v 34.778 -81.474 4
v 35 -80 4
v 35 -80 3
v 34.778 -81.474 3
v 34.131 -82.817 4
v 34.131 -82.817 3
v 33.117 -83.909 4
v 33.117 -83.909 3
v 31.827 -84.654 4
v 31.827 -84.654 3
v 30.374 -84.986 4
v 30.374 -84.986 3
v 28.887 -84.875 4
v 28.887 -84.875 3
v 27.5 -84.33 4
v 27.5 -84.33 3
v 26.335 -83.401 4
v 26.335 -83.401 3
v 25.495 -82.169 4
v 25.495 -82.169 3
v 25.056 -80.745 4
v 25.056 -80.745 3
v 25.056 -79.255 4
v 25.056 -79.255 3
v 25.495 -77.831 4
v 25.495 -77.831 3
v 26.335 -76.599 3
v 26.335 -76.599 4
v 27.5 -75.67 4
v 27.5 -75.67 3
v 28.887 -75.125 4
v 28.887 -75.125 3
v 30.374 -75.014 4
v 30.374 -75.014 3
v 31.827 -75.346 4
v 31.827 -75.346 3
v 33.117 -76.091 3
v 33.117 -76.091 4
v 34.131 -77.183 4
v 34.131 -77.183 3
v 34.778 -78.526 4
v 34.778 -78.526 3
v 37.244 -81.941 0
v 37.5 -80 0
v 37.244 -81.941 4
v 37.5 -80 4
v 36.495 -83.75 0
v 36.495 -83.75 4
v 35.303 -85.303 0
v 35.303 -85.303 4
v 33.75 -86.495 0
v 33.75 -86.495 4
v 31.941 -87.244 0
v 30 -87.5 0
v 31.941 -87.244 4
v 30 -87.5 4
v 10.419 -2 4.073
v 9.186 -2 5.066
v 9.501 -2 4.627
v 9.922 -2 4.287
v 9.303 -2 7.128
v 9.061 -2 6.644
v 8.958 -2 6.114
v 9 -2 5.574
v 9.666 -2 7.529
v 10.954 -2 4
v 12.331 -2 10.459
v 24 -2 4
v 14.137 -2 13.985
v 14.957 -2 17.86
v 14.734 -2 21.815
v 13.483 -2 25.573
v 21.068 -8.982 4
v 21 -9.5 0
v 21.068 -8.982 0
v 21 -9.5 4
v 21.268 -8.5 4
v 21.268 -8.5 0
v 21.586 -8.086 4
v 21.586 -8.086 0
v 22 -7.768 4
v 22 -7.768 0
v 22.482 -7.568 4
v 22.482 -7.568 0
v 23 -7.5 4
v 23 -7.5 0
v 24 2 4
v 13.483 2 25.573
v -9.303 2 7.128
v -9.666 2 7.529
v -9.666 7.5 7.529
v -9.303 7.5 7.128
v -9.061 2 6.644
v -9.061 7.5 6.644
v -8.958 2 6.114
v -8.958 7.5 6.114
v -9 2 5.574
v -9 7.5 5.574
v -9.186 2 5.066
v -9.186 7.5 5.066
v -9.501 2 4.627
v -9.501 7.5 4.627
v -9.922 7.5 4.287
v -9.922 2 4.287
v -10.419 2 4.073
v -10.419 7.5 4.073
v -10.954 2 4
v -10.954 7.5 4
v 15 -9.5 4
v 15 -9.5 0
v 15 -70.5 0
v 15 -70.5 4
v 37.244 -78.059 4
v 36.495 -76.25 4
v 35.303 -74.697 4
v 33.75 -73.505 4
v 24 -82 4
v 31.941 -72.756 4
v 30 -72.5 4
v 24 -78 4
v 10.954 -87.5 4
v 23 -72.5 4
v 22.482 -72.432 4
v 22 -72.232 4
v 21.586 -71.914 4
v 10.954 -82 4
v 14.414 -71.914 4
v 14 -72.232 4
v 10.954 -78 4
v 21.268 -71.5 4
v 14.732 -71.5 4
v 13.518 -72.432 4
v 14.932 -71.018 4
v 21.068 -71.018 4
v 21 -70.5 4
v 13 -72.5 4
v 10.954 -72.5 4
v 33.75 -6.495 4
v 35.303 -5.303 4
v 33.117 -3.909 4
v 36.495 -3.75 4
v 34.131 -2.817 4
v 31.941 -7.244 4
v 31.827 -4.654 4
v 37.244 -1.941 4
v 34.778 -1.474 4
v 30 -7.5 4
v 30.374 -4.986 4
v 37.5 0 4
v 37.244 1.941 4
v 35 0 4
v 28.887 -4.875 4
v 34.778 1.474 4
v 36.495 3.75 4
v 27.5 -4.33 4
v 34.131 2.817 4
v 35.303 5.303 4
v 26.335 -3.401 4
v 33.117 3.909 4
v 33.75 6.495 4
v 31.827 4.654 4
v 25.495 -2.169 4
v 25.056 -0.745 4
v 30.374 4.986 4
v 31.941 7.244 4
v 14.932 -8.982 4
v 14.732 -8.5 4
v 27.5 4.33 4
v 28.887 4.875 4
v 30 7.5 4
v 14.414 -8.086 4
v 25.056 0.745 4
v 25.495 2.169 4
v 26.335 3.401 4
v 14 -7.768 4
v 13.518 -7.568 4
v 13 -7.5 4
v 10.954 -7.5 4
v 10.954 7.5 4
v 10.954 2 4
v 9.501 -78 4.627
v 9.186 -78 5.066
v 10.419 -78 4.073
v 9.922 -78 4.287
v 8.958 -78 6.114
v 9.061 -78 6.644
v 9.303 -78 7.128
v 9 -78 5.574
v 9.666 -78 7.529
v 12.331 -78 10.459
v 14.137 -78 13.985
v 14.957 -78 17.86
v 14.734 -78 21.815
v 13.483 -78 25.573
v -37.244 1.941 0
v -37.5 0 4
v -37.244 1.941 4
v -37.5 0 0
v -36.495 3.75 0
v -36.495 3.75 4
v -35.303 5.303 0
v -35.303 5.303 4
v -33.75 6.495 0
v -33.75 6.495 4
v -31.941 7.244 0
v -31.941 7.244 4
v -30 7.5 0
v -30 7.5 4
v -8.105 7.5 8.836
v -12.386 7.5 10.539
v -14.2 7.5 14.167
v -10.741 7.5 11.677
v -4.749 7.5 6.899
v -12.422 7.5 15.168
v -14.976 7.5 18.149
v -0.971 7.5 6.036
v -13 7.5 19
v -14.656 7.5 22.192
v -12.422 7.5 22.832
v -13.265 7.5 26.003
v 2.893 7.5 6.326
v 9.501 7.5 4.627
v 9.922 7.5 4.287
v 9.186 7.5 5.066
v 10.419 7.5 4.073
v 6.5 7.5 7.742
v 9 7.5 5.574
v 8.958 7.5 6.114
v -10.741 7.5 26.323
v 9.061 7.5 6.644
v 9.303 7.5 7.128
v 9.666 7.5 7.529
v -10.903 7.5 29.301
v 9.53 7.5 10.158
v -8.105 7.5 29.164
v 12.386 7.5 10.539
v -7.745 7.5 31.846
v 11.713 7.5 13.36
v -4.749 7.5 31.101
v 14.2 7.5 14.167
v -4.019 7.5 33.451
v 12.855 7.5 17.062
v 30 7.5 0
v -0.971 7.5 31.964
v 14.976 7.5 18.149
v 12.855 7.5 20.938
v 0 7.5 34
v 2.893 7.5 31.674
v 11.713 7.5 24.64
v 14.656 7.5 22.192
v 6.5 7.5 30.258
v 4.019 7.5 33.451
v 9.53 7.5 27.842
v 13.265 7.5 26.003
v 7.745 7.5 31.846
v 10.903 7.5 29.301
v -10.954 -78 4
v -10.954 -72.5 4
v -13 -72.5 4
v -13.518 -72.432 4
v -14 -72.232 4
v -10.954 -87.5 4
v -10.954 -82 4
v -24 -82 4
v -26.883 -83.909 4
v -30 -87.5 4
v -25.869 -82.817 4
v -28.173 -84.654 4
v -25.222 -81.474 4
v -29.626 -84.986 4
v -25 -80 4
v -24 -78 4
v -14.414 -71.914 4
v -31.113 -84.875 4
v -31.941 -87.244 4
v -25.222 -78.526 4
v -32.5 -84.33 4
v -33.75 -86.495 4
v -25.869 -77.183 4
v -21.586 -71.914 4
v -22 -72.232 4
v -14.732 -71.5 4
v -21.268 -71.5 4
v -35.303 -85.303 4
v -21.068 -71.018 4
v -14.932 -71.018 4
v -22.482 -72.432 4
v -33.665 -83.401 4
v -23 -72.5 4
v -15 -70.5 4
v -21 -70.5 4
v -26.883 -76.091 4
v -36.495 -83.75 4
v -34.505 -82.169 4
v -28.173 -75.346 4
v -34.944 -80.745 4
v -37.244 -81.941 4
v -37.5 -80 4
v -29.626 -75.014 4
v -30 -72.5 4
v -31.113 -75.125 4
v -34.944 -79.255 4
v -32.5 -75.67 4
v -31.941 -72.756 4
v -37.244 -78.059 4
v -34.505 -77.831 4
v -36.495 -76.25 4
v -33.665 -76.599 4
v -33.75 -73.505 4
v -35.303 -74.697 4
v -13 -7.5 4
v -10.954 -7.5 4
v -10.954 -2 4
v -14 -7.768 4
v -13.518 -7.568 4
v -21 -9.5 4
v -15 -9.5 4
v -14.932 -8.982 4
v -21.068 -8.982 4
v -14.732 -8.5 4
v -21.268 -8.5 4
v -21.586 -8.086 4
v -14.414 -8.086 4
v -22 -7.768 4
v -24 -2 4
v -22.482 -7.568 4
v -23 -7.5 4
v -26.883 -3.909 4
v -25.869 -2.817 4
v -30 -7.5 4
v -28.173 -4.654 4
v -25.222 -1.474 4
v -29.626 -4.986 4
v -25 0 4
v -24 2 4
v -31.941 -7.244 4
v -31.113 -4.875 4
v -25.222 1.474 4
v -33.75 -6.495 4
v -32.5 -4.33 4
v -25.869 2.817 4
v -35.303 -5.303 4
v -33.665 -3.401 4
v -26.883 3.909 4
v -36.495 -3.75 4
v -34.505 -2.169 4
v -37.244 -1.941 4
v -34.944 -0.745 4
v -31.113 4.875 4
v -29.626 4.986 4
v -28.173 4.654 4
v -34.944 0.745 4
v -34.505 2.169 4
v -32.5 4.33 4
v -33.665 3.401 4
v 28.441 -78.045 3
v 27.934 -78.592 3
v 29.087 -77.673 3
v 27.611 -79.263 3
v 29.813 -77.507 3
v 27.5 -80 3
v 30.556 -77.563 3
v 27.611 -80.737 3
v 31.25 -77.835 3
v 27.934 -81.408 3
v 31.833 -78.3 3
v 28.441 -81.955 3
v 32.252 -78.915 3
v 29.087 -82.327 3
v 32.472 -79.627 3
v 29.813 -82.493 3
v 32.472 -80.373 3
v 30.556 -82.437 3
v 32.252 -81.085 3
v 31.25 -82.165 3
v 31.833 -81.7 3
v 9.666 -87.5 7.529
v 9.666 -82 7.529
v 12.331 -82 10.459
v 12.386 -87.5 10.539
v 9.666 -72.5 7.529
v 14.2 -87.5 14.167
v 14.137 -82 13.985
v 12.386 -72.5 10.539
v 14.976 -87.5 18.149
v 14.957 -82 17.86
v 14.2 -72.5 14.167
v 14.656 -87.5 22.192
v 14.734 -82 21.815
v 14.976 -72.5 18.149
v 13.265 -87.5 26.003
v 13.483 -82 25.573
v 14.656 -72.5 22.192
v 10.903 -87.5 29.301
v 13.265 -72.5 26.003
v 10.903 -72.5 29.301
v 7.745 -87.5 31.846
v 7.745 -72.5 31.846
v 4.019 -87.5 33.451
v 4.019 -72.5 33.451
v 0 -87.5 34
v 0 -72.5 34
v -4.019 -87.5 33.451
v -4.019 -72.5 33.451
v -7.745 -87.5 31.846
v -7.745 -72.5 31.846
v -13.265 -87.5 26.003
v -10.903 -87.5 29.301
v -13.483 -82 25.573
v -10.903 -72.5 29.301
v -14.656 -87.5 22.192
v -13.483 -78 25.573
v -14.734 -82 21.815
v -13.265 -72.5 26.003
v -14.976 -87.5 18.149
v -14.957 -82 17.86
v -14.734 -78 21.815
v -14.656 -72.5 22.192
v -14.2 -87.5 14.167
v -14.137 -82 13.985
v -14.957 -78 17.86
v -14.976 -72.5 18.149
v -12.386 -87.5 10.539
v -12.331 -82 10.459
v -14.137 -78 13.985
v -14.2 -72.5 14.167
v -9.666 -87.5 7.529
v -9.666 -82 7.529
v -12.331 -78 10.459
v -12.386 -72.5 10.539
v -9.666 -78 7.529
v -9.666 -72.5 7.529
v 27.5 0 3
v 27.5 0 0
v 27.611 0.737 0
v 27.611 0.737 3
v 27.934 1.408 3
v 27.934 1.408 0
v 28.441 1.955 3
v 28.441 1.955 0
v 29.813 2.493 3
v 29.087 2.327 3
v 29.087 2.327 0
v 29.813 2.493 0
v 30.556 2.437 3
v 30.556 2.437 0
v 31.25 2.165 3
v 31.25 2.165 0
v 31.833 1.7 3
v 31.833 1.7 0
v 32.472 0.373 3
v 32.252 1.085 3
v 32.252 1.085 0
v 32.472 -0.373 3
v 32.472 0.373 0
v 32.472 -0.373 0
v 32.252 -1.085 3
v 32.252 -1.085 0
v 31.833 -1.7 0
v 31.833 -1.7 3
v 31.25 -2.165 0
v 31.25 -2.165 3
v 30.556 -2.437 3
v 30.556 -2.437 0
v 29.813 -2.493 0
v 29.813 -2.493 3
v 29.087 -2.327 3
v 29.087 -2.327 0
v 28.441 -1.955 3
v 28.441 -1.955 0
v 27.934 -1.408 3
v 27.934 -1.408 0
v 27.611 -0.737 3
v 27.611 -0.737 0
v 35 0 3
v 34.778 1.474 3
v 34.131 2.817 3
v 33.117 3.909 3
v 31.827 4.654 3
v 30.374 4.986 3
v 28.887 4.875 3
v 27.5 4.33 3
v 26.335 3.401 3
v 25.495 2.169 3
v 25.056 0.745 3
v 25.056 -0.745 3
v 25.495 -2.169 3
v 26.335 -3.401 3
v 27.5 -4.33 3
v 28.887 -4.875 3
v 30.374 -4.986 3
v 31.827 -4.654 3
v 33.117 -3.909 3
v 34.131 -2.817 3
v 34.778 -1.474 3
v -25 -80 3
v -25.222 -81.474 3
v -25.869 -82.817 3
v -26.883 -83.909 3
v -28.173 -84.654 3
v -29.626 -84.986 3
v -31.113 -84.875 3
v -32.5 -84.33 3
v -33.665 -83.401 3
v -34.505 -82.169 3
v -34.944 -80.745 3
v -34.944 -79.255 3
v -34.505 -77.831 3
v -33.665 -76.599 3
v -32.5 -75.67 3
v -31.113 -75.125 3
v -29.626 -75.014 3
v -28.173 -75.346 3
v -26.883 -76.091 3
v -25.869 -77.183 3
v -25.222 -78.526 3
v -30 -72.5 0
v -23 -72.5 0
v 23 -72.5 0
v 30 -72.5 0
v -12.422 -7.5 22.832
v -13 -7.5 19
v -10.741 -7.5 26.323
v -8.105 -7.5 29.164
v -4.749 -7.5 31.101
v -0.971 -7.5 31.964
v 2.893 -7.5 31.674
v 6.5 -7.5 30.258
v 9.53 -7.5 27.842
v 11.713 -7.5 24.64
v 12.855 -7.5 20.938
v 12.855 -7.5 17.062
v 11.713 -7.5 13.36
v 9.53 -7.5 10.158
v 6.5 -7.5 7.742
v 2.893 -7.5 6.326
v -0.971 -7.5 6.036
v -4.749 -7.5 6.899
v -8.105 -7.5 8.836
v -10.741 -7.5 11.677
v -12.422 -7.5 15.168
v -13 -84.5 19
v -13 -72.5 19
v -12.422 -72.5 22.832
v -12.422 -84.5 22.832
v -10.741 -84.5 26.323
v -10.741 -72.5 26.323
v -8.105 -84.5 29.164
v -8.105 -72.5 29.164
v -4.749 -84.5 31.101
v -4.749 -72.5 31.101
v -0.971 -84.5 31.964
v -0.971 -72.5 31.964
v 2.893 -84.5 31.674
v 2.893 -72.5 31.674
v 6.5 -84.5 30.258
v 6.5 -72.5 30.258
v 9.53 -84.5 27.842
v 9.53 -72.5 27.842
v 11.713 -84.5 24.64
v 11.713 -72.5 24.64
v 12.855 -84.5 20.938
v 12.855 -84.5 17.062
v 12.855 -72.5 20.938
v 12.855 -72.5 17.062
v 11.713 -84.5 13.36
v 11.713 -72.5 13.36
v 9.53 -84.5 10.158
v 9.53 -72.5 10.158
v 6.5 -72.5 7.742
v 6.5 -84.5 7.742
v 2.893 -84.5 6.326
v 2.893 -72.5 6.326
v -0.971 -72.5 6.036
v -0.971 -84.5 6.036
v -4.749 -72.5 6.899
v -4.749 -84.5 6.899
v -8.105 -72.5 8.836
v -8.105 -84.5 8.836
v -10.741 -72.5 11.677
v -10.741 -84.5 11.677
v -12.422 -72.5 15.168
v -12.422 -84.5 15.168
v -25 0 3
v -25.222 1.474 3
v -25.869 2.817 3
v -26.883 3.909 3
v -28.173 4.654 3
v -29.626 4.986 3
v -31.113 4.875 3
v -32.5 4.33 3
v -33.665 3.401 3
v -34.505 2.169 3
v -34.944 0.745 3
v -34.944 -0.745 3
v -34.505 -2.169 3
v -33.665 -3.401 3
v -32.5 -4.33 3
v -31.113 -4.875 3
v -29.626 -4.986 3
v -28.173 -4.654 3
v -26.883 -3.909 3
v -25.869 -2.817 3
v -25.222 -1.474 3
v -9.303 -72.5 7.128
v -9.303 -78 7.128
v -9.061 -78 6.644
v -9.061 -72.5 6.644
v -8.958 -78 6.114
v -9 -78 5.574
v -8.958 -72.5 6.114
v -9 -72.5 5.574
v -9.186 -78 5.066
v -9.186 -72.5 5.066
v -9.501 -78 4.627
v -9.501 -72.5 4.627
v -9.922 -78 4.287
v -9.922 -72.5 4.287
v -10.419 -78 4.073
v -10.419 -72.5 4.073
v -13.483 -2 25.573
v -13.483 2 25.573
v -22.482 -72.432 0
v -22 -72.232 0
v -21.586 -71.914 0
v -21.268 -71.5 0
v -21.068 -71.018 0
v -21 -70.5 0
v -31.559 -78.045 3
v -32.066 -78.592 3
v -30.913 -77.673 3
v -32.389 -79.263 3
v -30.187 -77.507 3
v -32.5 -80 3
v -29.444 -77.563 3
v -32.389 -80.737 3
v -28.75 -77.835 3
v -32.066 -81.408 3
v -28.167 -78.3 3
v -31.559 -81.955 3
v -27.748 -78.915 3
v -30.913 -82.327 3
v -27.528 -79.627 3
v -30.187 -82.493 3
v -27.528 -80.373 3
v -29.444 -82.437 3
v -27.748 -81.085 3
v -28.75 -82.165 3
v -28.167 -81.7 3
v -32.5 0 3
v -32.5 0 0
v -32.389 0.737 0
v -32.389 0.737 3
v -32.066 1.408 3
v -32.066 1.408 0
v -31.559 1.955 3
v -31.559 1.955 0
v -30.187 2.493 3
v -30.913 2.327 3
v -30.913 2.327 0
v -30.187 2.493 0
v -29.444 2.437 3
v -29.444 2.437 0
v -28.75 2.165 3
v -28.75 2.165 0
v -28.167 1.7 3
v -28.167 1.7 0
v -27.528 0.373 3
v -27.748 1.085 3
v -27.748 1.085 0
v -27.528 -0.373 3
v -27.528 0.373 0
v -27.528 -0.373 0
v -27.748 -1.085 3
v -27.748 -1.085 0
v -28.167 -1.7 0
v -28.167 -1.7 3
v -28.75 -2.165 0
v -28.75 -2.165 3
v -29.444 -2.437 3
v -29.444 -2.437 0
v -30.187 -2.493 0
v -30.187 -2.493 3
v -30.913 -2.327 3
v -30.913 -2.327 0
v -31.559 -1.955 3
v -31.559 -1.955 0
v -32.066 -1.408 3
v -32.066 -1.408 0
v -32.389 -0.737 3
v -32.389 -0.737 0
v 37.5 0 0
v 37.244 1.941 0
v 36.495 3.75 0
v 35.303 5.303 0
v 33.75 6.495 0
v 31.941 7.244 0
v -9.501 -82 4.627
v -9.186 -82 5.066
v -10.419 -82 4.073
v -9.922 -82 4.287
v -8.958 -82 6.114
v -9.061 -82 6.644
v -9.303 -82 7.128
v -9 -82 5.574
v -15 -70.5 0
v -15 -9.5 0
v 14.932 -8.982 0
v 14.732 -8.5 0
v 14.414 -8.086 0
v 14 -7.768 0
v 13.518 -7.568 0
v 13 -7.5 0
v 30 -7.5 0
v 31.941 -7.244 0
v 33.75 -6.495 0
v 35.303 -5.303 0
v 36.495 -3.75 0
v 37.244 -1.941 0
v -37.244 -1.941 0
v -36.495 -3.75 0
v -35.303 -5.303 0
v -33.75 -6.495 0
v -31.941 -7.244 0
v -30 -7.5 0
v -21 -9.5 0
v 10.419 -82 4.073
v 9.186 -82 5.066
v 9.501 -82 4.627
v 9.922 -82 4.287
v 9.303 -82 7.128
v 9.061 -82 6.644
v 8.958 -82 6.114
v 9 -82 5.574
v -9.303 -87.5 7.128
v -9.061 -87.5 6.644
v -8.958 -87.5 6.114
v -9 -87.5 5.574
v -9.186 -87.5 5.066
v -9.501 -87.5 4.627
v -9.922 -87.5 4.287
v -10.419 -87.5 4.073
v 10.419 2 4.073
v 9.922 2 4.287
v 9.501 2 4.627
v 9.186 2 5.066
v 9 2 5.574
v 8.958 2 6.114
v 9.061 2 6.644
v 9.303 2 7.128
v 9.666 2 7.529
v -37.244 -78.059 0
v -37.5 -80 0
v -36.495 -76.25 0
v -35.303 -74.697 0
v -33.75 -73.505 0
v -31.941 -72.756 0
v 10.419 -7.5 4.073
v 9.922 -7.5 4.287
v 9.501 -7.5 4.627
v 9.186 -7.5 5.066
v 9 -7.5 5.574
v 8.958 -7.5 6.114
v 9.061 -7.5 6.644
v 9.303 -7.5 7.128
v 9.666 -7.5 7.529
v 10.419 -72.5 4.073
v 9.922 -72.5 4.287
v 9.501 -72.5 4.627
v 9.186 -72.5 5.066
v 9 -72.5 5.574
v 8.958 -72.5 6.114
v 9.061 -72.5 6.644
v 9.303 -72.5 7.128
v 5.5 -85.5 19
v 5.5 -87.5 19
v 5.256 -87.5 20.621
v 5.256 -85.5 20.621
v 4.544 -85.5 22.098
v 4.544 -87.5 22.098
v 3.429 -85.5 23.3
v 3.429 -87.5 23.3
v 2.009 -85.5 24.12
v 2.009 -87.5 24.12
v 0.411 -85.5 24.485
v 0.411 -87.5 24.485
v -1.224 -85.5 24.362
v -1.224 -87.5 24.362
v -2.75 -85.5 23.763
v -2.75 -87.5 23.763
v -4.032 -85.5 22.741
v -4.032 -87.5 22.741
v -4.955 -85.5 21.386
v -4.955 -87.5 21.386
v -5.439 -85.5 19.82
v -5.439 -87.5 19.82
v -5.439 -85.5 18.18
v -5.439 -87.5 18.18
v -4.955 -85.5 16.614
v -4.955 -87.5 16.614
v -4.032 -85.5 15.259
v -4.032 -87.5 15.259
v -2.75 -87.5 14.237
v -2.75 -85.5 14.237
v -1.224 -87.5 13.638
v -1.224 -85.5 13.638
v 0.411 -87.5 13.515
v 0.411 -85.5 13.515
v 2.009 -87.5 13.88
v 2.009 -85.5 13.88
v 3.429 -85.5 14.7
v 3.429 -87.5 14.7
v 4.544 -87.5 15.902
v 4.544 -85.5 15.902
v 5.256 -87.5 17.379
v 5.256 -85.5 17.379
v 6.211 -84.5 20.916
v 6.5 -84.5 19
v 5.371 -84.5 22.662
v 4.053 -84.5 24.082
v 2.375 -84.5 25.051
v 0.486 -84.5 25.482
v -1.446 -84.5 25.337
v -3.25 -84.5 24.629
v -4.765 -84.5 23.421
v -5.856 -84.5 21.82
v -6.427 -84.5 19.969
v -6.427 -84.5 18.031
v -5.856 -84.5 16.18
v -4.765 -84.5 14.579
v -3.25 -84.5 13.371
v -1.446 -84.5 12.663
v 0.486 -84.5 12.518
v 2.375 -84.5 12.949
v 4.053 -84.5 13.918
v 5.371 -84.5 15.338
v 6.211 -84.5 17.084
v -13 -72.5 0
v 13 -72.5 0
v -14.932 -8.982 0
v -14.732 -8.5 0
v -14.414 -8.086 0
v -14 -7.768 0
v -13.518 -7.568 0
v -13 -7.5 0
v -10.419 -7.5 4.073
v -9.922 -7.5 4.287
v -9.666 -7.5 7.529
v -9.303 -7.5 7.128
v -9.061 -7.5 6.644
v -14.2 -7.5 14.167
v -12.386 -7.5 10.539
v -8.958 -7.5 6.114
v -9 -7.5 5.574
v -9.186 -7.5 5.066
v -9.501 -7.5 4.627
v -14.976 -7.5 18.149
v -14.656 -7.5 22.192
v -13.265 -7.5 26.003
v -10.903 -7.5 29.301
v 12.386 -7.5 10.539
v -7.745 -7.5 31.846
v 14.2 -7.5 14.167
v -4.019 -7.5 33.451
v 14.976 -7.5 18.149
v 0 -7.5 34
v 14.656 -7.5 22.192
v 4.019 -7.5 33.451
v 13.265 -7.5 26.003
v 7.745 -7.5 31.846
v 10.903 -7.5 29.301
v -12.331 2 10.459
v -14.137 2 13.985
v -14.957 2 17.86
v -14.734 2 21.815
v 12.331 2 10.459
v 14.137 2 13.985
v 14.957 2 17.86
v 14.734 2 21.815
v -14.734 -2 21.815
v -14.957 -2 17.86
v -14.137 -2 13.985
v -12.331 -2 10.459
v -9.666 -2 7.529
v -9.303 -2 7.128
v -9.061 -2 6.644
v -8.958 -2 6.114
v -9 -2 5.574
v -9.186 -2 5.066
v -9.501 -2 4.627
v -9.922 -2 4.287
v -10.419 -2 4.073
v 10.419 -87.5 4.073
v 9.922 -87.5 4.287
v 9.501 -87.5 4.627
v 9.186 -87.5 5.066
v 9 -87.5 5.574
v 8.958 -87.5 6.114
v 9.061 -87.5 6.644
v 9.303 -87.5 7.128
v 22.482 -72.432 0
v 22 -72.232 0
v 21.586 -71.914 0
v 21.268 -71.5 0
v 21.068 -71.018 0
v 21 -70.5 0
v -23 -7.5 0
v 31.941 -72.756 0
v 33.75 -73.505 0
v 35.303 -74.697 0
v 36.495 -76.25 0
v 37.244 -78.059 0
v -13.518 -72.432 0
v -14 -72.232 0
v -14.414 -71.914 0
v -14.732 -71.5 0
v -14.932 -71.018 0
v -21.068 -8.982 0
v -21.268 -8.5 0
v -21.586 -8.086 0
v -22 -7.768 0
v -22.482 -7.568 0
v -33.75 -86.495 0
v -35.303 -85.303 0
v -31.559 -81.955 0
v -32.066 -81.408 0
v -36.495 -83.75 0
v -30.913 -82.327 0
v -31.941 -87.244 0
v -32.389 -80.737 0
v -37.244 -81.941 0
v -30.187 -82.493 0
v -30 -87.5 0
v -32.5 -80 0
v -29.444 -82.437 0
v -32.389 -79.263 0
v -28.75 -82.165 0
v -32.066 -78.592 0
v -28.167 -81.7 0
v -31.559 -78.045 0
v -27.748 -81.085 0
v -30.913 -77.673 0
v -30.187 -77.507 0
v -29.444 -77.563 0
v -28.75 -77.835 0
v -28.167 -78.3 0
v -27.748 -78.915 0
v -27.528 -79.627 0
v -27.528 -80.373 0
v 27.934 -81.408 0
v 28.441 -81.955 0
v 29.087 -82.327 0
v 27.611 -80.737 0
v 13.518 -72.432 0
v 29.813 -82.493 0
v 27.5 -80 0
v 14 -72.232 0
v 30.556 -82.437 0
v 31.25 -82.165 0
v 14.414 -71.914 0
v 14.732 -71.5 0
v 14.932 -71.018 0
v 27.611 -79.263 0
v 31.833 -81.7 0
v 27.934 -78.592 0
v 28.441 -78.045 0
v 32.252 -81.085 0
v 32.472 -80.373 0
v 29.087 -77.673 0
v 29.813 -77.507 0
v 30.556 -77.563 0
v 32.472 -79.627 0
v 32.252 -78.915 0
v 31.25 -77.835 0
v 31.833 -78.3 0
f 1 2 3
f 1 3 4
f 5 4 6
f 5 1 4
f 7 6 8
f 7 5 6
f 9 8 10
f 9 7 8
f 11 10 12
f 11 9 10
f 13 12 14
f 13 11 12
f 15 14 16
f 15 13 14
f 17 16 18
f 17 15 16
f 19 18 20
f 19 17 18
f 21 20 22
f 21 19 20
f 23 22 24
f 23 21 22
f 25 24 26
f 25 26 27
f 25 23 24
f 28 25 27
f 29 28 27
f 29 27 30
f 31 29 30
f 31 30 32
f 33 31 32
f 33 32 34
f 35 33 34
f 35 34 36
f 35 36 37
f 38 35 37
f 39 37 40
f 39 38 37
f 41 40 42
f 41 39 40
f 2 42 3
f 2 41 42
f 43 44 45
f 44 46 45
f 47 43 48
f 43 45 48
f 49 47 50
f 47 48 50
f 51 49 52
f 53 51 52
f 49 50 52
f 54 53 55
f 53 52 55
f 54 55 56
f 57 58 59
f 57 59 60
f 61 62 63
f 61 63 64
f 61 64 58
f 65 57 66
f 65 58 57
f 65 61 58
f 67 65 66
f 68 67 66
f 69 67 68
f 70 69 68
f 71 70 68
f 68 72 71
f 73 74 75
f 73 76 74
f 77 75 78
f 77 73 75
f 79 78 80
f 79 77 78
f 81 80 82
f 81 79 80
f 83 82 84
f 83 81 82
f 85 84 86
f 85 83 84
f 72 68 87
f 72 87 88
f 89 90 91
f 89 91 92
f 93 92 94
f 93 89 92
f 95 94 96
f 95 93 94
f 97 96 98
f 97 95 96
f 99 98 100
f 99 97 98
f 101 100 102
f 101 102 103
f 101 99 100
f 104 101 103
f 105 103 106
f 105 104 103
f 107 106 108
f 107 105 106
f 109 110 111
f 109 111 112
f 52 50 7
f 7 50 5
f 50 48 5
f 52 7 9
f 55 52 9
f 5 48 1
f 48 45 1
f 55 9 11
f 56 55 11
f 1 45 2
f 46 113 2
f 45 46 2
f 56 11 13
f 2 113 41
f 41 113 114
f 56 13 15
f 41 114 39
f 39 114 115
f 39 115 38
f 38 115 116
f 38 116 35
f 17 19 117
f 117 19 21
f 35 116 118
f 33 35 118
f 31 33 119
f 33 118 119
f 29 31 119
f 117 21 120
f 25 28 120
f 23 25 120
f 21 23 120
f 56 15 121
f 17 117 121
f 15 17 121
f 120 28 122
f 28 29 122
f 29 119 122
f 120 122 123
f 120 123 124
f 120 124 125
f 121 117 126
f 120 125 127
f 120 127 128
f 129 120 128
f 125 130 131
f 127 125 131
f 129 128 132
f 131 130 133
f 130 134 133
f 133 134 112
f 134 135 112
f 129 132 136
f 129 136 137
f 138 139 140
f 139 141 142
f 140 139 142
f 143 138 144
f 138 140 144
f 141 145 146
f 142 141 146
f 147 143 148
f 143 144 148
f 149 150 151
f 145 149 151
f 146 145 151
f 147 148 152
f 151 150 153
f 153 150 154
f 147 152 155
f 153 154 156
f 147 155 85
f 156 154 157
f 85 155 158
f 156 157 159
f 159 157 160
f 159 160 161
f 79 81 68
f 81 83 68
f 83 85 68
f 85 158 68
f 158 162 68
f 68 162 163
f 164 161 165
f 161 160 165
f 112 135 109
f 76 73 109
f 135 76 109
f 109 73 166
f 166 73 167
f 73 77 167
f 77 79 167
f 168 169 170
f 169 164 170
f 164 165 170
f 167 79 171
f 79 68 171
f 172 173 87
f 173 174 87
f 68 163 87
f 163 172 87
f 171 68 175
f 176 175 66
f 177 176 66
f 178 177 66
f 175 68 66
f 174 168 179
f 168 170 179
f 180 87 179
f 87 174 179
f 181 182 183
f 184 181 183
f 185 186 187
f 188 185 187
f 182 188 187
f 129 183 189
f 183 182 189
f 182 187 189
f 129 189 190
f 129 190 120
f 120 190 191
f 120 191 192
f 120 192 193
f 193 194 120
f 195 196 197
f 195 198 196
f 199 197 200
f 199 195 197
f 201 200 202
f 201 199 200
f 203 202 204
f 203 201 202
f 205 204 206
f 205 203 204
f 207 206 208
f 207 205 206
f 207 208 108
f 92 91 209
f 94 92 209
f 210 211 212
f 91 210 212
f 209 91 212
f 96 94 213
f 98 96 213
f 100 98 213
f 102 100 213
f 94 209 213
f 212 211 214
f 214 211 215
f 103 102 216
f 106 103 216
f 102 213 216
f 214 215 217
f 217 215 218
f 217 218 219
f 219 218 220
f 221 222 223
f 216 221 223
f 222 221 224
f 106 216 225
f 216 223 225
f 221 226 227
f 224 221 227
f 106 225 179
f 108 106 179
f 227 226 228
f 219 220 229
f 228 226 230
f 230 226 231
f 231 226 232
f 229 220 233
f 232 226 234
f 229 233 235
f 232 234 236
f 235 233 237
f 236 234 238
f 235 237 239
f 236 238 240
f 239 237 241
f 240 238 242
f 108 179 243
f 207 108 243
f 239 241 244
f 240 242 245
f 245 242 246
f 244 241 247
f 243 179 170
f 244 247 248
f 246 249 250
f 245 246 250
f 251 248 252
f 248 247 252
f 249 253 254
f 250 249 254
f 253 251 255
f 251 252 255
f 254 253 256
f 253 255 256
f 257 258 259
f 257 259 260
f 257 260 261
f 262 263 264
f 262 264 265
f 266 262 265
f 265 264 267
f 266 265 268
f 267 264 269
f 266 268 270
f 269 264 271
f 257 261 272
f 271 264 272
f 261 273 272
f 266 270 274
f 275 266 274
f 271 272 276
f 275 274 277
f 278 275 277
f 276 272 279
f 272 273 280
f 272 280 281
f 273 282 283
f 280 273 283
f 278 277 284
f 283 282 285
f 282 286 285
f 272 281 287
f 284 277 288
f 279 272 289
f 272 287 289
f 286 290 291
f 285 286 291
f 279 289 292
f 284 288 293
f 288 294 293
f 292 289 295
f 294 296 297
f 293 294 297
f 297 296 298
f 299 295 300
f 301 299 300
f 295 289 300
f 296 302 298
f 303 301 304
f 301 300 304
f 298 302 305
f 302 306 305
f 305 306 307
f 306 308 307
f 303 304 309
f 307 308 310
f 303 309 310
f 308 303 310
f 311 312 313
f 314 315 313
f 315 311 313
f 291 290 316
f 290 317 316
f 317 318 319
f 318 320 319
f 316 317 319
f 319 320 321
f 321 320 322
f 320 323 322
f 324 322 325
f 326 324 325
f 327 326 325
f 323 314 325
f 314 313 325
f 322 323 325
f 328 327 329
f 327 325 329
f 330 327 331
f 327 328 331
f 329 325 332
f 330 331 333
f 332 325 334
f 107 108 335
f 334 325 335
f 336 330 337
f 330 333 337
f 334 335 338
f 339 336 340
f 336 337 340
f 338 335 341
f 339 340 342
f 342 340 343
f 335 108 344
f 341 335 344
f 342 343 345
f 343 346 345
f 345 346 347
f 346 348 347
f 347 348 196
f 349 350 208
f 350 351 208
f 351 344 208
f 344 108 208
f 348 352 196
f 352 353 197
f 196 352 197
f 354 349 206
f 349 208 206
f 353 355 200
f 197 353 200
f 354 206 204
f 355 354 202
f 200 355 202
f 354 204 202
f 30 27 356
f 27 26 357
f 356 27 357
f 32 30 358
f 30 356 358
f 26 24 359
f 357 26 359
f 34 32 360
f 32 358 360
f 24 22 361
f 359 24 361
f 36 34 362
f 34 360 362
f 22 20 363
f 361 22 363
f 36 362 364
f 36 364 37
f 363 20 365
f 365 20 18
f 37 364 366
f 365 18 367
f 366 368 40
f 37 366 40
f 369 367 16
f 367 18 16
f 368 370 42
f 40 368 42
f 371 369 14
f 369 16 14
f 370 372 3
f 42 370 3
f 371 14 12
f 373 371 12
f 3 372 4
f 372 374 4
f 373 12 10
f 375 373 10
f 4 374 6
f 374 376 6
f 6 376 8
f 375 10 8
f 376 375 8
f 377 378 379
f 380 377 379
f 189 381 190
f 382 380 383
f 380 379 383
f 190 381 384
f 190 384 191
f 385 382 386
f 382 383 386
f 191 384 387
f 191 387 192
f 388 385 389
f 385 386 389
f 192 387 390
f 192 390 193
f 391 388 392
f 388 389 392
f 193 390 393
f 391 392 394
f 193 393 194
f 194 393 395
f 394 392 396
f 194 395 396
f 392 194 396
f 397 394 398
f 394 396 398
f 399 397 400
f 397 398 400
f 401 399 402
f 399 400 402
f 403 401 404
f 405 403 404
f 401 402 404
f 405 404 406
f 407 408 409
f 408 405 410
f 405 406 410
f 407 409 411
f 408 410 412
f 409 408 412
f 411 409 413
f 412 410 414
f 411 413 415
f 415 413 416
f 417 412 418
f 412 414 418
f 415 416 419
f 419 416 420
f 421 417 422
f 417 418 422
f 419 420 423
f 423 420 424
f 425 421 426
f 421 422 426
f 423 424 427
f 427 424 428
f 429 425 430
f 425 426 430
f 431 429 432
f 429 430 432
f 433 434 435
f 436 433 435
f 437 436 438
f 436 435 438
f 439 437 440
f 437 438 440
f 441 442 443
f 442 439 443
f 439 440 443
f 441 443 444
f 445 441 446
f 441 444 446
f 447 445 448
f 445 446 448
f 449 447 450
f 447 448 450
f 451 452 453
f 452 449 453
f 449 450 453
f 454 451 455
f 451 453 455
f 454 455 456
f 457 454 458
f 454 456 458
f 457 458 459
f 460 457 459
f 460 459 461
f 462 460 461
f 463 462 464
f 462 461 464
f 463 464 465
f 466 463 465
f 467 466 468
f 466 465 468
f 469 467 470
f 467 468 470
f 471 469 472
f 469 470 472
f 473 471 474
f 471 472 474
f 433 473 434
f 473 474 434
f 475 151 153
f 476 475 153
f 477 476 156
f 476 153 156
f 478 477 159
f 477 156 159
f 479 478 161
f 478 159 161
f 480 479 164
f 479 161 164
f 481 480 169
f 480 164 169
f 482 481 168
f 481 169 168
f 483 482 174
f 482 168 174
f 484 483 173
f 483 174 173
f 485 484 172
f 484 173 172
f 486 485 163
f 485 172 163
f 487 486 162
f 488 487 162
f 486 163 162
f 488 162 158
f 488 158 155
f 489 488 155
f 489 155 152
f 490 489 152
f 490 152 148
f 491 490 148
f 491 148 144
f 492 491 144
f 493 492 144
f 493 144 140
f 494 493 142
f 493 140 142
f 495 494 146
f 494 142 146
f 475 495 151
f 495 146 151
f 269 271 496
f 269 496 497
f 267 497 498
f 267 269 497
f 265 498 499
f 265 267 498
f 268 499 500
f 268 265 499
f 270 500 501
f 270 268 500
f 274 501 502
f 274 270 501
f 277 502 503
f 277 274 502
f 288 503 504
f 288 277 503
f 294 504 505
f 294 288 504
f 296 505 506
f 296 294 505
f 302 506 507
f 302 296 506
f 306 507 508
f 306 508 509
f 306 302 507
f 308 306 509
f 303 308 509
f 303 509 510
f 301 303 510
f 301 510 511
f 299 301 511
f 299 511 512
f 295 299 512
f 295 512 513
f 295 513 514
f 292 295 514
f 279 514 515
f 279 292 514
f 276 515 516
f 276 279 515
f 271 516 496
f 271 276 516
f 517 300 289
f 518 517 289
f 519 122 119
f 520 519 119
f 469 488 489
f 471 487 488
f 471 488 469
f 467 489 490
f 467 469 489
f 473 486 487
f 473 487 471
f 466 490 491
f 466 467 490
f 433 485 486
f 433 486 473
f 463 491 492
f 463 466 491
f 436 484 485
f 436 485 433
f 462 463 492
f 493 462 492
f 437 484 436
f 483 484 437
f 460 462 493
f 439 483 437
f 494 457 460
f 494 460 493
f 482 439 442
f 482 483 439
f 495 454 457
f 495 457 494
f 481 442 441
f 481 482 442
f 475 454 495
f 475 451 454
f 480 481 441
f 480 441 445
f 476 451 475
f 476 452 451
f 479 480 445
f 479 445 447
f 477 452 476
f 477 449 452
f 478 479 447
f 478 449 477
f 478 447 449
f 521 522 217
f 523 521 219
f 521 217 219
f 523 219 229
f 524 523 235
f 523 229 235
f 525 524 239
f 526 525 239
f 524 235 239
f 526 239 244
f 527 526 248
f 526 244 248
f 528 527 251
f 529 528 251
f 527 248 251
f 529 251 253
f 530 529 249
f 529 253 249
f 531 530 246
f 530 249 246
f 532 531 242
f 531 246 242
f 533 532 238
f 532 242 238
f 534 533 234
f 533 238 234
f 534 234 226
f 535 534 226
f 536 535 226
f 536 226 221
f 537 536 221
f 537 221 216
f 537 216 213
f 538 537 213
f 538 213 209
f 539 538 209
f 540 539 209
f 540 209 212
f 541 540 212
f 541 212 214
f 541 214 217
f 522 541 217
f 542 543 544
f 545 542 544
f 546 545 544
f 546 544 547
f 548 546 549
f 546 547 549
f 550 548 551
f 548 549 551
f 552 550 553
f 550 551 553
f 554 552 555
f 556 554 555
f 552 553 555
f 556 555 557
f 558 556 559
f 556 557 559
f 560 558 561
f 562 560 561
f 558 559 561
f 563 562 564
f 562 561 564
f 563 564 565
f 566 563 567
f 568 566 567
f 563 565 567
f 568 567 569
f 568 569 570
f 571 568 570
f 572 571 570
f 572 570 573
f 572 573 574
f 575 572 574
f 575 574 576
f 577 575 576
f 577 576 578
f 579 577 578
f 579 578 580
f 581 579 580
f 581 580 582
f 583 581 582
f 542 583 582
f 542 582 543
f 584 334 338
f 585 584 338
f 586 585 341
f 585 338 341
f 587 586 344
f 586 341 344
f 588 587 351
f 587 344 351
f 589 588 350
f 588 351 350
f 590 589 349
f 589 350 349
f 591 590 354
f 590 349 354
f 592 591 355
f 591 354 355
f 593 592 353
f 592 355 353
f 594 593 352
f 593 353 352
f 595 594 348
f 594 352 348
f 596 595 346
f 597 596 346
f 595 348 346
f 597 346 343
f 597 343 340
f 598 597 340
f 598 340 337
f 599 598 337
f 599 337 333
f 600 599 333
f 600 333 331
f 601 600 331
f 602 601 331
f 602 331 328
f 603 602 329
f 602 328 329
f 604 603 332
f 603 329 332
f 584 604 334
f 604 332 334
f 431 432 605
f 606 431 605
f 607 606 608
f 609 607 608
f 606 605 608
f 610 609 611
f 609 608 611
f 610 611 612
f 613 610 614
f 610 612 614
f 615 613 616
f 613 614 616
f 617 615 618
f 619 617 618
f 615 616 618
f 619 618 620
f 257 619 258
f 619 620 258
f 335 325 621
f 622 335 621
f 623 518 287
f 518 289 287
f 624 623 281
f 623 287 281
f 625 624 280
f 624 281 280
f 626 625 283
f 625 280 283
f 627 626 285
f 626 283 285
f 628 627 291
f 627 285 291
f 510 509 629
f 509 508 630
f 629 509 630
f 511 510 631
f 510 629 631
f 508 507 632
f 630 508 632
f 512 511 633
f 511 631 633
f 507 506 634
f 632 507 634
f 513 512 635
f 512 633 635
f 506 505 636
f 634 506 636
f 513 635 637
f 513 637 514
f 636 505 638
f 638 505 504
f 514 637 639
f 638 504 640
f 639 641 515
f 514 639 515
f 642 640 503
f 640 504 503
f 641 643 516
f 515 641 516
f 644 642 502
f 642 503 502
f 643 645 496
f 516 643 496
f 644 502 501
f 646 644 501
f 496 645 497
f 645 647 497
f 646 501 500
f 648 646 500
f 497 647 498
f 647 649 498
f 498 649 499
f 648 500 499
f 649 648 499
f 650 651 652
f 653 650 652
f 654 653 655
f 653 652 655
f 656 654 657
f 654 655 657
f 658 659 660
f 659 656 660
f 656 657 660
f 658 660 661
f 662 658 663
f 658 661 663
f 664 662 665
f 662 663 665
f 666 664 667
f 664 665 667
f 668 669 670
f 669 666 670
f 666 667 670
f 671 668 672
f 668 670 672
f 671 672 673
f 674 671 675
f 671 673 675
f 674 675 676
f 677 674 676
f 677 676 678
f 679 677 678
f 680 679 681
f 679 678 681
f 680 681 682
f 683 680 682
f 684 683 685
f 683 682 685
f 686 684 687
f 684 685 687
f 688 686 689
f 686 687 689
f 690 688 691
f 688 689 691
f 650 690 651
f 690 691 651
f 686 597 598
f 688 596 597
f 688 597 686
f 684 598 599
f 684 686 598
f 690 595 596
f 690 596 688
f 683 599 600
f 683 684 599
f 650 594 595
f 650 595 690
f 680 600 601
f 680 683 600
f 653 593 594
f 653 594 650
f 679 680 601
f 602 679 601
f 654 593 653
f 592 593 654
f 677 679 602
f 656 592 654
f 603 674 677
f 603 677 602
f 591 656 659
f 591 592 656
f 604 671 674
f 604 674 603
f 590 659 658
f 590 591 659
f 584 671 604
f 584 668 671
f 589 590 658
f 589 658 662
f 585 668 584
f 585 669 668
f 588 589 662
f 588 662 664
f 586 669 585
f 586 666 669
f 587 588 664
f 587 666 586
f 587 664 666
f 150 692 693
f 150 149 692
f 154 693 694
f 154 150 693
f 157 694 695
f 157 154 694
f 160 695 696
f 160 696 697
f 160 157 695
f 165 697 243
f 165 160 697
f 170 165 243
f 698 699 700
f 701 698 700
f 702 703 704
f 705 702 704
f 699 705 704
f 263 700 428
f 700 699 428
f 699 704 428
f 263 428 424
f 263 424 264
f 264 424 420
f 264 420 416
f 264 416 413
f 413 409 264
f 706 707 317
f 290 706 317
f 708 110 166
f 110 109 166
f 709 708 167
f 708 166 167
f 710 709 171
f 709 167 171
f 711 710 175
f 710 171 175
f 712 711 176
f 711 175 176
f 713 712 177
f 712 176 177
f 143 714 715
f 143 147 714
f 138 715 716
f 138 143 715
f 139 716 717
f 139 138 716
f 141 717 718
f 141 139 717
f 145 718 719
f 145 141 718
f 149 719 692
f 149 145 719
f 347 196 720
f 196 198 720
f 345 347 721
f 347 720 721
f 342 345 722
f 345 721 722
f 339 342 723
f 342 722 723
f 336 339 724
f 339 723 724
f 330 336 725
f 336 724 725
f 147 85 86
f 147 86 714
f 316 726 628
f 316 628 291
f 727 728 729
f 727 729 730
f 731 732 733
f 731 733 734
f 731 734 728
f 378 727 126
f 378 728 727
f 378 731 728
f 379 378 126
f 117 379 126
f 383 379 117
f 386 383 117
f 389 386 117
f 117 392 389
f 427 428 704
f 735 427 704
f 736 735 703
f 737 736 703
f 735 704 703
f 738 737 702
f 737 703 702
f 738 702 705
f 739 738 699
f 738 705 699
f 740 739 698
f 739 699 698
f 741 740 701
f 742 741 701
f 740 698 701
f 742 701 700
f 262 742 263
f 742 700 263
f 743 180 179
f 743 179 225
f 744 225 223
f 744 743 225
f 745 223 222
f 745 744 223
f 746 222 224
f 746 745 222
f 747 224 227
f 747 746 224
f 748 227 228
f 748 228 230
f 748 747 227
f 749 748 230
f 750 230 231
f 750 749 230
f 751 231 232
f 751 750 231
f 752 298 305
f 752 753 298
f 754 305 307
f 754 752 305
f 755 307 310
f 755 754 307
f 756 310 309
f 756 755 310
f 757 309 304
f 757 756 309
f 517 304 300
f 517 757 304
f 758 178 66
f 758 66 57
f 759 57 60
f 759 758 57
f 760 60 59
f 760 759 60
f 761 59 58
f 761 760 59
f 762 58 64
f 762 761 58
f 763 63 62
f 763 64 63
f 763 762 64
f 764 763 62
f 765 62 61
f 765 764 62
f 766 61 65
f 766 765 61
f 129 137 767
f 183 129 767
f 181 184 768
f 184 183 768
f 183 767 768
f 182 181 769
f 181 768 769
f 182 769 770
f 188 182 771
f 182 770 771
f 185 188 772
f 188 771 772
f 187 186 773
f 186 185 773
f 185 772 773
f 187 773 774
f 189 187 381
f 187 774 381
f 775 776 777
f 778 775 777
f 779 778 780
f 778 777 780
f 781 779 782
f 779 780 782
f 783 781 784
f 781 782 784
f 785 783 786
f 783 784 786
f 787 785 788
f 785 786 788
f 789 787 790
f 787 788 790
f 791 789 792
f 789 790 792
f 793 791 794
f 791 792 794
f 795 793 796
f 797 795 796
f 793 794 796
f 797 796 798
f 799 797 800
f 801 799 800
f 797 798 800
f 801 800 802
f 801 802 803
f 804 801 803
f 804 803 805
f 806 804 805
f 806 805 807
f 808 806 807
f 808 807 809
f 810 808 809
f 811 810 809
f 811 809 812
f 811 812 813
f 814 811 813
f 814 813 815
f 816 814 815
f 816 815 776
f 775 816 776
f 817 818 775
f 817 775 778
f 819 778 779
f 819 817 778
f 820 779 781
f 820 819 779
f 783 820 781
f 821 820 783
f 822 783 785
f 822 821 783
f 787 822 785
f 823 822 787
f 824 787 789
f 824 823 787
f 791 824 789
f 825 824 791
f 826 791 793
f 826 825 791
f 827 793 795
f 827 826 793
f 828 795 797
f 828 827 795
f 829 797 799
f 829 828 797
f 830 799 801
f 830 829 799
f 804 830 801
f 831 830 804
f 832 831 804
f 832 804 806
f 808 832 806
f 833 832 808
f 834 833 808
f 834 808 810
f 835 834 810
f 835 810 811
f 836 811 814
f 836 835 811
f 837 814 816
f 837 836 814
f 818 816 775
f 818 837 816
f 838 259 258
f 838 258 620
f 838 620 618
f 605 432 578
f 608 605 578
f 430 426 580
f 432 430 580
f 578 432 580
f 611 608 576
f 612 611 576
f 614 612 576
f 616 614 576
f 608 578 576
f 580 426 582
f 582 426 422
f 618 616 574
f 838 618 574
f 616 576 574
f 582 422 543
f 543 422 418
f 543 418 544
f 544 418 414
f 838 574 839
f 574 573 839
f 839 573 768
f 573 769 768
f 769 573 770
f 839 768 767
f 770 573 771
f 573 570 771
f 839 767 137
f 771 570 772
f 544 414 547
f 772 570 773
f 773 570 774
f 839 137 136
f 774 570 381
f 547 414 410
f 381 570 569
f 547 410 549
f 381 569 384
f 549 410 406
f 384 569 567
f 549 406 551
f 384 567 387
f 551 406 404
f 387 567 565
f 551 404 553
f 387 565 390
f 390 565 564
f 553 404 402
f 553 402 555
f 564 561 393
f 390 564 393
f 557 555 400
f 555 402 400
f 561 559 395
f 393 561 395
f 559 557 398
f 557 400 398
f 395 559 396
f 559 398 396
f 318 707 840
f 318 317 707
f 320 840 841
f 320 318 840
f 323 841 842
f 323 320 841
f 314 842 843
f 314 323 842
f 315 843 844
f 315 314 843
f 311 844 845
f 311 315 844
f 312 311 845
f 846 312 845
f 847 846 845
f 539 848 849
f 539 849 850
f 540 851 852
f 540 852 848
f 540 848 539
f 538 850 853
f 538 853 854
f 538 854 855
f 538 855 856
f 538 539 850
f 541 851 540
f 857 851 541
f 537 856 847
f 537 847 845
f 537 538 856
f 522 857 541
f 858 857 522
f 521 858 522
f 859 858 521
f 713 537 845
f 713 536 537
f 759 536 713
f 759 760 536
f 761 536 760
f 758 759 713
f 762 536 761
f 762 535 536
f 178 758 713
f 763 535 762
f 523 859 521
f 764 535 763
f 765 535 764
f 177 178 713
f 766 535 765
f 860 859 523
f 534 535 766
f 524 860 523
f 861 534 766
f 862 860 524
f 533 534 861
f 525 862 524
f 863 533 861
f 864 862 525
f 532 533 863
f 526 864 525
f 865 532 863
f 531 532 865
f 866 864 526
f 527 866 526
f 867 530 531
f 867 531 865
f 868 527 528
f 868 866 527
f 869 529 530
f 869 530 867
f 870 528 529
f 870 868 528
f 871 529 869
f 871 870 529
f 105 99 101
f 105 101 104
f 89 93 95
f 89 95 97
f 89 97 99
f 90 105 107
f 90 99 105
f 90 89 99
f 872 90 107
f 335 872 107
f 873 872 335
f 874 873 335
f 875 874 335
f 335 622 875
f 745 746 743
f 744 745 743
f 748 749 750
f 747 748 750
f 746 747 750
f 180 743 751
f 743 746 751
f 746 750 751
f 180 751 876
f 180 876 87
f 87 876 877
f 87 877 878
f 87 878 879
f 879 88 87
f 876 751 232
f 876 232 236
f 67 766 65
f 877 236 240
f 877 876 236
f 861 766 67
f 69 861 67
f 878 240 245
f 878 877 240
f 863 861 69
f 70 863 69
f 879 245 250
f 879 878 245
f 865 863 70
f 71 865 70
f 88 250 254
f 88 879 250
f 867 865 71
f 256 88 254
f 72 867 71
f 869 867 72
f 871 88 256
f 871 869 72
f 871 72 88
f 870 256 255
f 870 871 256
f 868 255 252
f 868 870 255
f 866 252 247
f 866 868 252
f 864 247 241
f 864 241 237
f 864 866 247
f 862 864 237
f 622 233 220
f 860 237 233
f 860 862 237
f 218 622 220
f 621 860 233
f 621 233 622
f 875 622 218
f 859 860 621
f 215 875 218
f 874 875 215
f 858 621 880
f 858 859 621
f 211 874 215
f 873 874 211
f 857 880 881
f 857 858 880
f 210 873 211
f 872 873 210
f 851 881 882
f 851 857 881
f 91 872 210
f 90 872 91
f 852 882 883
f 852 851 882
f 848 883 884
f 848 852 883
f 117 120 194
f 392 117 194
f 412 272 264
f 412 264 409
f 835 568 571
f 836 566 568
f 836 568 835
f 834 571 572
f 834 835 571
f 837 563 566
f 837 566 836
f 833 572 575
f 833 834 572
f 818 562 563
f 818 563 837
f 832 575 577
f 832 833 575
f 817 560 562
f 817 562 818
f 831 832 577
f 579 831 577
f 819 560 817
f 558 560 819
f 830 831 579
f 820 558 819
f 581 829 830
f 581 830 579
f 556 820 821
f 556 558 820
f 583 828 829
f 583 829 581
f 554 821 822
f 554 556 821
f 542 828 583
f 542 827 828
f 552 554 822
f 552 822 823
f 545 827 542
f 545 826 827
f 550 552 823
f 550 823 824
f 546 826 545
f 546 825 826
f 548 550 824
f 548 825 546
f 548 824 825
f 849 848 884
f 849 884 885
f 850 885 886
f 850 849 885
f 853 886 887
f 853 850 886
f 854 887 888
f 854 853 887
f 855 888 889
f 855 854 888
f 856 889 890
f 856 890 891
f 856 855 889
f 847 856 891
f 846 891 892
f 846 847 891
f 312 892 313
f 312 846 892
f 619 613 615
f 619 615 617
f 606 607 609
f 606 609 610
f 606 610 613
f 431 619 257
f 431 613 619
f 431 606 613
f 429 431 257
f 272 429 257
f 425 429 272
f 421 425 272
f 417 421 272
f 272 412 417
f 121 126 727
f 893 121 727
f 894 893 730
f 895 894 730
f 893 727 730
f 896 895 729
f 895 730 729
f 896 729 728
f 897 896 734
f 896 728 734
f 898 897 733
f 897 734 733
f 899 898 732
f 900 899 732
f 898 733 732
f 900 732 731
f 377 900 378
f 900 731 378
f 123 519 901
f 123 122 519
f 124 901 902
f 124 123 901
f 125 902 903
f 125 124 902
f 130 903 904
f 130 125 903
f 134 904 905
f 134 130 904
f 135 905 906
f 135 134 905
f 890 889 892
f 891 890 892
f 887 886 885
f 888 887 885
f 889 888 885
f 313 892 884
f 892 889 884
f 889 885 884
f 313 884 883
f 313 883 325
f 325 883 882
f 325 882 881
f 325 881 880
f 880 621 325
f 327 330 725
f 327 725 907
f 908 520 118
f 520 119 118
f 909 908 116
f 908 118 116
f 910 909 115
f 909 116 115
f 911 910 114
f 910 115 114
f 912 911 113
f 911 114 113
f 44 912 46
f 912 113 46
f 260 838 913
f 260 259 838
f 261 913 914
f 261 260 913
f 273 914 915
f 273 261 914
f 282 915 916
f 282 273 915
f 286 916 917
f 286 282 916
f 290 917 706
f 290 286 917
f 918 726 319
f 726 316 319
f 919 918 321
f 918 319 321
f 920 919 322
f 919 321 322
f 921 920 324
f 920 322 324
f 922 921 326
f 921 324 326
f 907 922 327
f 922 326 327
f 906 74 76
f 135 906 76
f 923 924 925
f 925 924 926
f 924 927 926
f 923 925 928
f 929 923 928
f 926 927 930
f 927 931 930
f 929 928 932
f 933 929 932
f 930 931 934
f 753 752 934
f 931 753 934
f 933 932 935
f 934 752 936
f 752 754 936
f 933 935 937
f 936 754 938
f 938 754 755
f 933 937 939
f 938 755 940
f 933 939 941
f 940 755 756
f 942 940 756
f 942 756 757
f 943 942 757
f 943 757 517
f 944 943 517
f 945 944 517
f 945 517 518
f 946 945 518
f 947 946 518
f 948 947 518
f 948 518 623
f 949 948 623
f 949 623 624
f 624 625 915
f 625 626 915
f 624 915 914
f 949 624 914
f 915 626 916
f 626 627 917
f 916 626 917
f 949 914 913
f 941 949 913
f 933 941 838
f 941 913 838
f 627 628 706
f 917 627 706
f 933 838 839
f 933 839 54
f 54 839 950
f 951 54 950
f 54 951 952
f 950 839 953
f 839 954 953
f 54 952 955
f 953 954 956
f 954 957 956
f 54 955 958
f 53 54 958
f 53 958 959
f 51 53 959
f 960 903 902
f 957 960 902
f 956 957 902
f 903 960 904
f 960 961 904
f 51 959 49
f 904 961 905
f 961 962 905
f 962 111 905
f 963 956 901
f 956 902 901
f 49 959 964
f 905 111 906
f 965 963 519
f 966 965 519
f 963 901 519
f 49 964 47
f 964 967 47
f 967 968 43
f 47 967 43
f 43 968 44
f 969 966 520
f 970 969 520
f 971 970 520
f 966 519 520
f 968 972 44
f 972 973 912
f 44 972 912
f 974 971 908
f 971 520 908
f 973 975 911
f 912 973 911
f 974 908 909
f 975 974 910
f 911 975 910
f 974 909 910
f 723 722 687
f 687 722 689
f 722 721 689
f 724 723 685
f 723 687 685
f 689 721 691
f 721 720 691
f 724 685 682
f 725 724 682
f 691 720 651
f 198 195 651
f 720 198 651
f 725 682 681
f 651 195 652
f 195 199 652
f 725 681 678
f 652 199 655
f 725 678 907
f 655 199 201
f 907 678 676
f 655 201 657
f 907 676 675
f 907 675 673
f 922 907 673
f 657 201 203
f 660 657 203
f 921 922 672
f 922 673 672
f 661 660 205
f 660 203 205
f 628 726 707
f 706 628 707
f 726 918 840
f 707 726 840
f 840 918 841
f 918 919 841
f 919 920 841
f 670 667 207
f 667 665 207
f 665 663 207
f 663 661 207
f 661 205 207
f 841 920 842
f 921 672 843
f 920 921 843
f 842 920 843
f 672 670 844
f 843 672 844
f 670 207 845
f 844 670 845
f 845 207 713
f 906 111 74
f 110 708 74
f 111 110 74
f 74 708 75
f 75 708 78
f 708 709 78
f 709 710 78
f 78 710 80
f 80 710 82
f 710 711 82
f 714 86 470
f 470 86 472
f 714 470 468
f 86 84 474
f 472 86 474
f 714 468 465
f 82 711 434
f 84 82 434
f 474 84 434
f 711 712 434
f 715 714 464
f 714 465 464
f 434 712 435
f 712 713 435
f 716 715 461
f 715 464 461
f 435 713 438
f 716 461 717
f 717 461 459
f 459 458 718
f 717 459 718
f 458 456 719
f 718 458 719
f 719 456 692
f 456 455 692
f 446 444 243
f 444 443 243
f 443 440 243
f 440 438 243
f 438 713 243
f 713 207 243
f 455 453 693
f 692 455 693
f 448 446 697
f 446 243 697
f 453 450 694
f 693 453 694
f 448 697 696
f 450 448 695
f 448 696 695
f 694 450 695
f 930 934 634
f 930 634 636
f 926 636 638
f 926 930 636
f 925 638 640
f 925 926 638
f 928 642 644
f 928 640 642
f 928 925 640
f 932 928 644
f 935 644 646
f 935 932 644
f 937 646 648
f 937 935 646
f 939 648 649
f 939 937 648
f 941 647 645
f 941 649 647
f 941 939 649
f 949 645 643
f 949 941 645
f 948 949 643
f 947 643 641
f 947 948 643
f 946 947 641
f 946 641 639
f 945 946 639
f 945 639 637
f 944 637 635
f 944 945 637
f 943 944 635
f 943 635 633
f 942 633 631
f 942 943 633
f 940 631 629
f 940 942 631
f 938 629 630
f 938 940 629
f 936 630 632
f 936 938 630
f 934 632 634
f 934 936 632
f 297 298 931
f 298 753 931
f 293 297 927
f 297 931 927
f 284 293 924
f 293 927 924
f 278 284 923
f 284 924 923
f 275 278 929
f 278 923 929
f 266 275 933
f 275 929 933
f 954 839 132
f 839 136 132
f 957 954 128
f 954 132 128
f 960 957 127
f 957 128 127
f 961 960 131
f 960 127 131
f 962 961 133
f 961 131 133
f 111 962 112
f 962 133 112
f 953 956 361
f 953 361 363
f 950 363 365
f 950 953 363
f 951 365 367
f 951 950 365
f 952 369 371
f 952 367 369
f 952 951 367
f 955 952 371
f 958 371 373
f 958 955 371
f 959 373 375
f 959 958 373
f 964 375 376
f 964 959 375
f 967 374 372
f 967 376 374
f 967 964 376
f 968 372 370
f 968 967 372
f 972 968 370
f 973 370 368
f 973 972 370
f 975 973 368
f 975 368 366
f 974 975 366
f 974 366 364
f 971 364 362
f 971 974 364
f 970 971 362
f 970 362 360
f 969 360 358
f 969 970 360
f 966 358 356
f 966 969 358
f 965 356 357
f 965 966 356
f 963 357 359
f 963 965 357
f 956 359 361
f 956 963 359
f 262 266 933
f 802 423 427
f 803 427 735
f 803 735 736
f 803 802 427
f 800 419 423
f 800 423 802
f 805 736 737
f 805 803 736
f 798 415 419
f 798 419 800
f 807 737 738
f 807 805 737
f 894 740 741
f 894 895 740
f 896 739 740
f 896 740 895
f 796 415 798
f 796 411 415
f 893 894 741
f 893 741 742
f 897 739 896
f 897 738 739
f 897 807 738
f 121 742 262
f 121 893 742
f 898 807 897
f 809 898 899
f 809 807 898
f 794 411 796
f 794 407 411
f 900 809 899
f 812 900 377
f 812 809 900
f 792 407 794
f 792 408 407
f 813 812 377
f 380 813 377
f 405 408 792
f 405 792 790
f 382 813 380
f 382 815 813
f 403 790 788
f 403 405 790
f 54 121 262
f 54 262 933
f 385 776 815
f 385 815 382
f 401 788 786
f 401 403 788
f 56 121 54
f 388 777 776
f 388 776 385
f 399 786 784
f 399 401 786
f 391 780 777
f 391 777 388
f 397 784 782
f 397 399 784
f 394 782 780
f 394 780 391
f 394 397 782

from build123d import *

# Parameters (mm, degrees)
F3_DEPTH       = 7.5
F4_R           = 7.49999
F6_D           = 5
F6_CBORE_D     = 10
F6_CBORE_DEPTH = 1
F8_DEPTH       = 2
F12_R          = 13
F13_DEPTH      = 92
F14_R          = 5.5
F15_DEPTH      = 95.001
F16_W          = 6
F16_H          = 4
F17_DEPTH      = 65
F18_R          = 2
F19_SIZE       = 1


# Not quite as in the source:
# - a fillet or chamfer is up to 0.001 mm smaller than in the source, because OpenCascade refuses the exact size


with BuildPart() as f3:
    # F2 (on Front) → F3 (new body, symmetric)
    with BuildSketch(Plane.XZ):
        with BuildLine():
            Line((-37.5, 0), (0, 0))
            Line((0, 0), (37.5, 0))
            Line((37.5, 0), (37.5, 4))
            Line((37.5, 4), (10.9544511501, 4))
            ThreePointArc((10.9544511501, 4), (9.0757782768, 5.3140056594), (9.6656921913, 7.5294117647))
            ThreePointArc((9.6656921913, 7.5294117647), (14.0900465494, 24.1449575543), (0, 34))
            ThreePointArc((0, 34), (-14.0900465494, 24.1449575543), (-9.6656921913, 7.5294117647))
            ThreePointArc((-9.6656921913, 7.5294117647), (-9.0757782768, 5.3140056594), (-10.9544511501, 4))
            Line((-10.9544511501, 4), (-37.5, 4))
            Line((-37.5, 4), (-37.5, 0))
        make_face()
    extrude(amount=F3_DEPTH, both=True)

    # F4 (radius 7.5 in the source; OpenCascade refuses exactly that, so slightly less here)
    f4_edges = [f3.edges().sort_by_distance(p)[0] for p in [
        (37.5, -7.5, 2),
        (37.5, 7.5, 2),
        (-37.5, -7.5, 2),
        (-37.5, 7.5, 2),
    ]]
    fillet(f4_edges, radius=F4_R)

    # F6 (through all)
    with Locations(Plane.XY.offset(4)):
        with Locations((30, 0), (-30, 0)):
            CounterBoreHole(F6_D / 2, F6_CBORE_D / 2, F6_CBORE_DEPTH)

    # F7 (on Front) → F8 (join, symmetric)
    with BuildSketch(Plane.XZ):
        with BuildLine():
            Line((10.9544511501, 4), (24, 4))
            Line((24, 4), (13.4831460674, 25.5730337079))
            ThreePointArc((13.4831460674, 25.5730337079), (14.6751576274, 15.8952055444), (9.6656921913, 7.5294117647))
            ThreePointArc((9.6656921913, 7.5294117647), (9.0757782768, 5.3140056594), (10.9544511501, 4))
        make_face()
    extrude(amount=F8_DEPTH, both=True)

    # F9: F3 across plane


with BuildPart() as f3_1:
    add(f3.part)
    add(f3.part.mirror(Plane.YZ))


with BuildPart() as f11_1:
    # F11: instance of F3
    add(f3_1.part.mirror(Plane.XZ.offset(40)))


with BuildPart() as f13_tool:
    # F12 (on face) → F13 (new body)
    with BuildSketch(Plane(origin=(0, 7.5, 0), x_dir=(-1, 0, 0), z_dir=(0, 1, 0))):
        with Locations((0, 19)):
            Circle(F12_R)
    extrude(amount=-F13_DEPTH)


with BuildPart() as f3_2:
    add(f3_1.part)

    # F13: cut by f13_tool
    add(f13_tool.part, mode=Mode.SUBTRACT)



with BuildPart() as f11_1_1:
    add(f11_1.part)

    # F13: cut by f13_tool
    add(f13_tool.part, mode=Mode.SUBTRACT)

    # F14 (on face) → F15 (cut, through all)
    with BuildSketch(Plane.XZ.offset(87.5)):
        with Locations((0, 19)):
            Circle(F14_R)
    extrude(amount=-F15_DEPTH, mode=Mode.SUBTRACT)


with BuildPart() as f3_3:
    add(f3_2.part)

    add(f11_1_1.part)  # F17 merges F11_1
    # F16 (on face) → F17 (join, through all)
    with BuildSketch(Plane.XZ.offset(7.5)):
        with Locations((18, 2)):
            Rectangle(F16_W, F16_H)
        with Locations((-18, 2)):
            Rectangle(F16_W, F16_H)
    extrude(amount=F17_DEPTH)

    # F18
    f18_edges = [f3_3.edges().sort_by_distance(p)[0] for p in [
        (21, -7.5, 2),
        (15, -7.5, 2),
        (21, -72.5, 2),
        (15, -72.5, 2),
        (-21, -7.5, 2),
        (-21, -72.5, 2),
        (-15, -72.5, 2),
        (-15, -7.5, 2),
    ]]
    fillet(f18_edges, radius=F18_R)

    # F19
    f19_edges = [f3_3.edges().sort_by_distance(p)[0] for p in [
        (-5.5, -84.5, 19),
    ]]
    chamfer(f19_edges, length=F19_SIZE)


solid = f3_3.part
